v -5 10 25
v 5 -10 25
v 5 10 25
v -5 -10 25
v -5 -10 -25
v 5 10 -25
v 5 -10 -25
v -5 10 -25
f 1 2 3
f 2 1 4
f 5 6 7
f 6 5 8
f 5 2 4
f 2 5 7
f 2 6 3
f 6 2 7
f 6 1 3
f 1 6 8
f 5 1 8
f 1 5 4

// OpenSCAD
/*
camera pos / rel pos; up/down/left/right/front/back/rotatex/rotatey/rotatez/rotateStep
view at object pos / rel pos; up/down/left/right/front/back, distance+vektorzoom
speed/time
accelspline-in / spline-out
fps
start/end
fadein/fadeoutsame as view at object
camera( [  cpoint( cameraAbsolute=[x,y,z], viewAtAbsolute=[x,y,z],zoom=50),  cpoint( name="point2", cameraUp=100, speed=50)] , fps=30) myModel();
move( [  mpoint(visible=false),  mpoint(sync="point2", fadein=true,distance=30),  mpoint(fadeout=true)]) myModel();
 */

rotate([0,0,$t*360])
	cube([10,20,50],center=true);
